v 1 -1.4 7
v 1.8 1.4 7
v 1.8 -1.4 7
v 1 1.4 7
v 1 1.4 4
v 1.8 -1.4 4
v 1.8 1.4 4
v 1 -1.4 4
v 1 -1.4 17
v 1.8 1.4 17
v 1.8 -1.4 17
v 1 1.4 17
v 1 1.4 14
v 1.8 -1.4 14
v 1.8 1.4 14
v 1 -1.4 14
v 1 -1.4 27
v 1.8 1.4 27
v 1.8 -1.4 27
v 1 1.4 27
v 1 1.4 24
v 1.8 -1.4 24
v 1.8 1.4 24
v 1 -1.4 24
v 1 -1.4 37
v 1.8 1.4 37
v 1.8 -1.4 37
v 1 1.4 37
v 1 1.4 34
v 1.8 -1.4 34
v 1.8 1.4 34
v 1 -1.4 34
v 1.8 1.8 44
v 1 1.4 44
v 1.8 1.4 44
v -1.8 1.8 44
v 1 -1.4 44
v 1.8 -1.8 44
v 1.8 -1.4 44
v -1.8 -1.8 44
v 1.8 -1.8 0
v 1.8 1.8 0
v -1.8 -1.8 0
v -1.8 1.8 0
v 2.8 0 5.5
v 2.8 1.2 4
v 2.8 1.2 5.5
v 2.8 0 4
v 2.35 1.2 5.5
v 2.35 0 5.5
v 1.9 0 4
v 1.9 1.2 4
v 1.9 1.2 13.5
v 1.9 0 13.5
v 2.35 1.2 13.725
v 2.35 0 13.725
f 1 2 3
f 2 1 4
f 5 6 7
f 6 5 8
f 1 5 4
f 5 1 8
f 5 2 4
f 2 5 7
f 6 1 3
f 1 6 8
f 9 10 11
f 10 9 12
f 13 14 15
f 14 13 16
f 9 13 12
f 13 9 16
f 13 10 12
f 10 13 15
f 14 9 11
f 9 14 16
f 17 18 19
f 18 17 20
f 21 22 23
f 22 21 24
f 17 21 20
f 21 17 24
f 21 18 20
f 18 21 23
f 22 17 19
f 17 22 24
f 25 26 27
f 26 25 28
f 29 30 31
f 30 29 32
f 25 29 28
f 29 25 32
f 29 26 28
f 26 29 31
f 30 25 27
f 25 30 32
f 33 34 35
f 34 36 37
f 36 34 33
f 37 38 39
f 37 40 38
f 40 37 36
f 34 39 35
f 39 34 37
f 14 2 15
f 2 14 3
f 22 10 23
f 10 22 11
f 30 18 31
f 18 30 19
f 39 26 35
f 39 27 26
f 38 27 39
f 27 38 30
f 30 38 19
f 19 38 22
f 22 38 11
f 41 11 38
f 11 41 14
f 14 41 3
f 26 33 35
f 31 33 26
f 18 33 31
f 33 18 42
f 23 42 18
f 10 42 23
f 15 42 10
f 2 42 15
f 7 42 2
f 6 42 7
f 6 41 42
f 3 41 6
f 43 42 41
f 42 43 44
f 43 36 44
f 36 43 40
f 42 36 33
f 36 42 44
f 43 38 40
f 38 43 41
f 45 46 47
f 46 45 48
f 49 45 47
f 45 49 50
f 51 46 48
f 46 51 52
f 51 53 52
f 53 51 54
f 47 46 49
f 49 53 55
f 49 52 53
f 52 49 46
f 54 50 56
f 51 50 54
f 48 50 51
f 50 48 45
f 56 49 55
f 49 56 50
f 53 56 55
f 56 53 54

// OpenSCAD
// DND-71 S6-LC ultra-low-cost shape display -- real OpenSCAD geometry.
//
// EVIDENCE CLASS: CAD (geometry only). No print, no measurement (DND-27).
// All dimensions are mirrored from ../analysis/s6lc.py.
//
// Machine: 8 banks of 10 rows (80x80 = 6,400 cells) at 5.08 mm pitch.
//   * square printed columns with a 5-pocket vertical rack (10 mm pockets);
//   * printed cantilever pawls (0.90 x 1.20 x 8.00 mm) holding a column;
//   * per-bank threshold mask gate (printed sliding comb) read from a medium;
//   * 8 banked release combs on a travelling reset carriage;
//   * one 4-screw belt-synced platen (printed frame, excluded from the BOM).
//
// Render (real OpenSCAD):
//   openscad -o s6lc_cell.stl       -D 'PART="cell"'    s6lc_machine.scad
//   openscad -o s6lc_bank.stl       -D 'PART="bank"'    s6lc_machine.scad
//   openscad -o s6lc_platen.stl     -D 'PART="platen"'  s6lc_machine.scad

PART = "cell";

// ---- product / geometry constants (analysis/s6lc.py) ----------------------
PITCH       = 5.08;
BODY        = 3.60;      // square column body (S1 lane budget: 3.60 + 1.48 = 5.08)
COL_H       = 44.0;      // column height (40 mm travel + 4 mm base)
TRAVEL      = 40.0;
LEVEL       = 10.0;
POCKET_H    = 3.0;       // rack pocket depth in Z
POCKET_D    = 0.8;       // rack pocket depth in X (S1 coupon)
PAWL_T      = 0.90;      // 2 extrusion lines
PAWL_W      = 1.20;
PAWL_L      = 8.00;
ROWS_BANK   = 10;
COLS        = 80;
BANKS       = 8;

$fn = 48;

module column_with_rack() {
    // Square column body with 5 rack pockets on the +X face.
    difference() {
        translate([-BODY/2, -BODY/2, 0]) cube([BODY, BODY, COL_H]);
        // rack pockets at 0,10,20,30,40 mm above the base
        for (k = [0:4]) {
            translate([BODY/2 - POCKET_D, -BODY/2 + 0.4, 4 + k*LEVEL])
                cube([POCKET_D + 1, BODY - 0.8, POCKET_H]);
        }
    }
}

module pawl() {
    // Rooted cantilever: base block + thin leaf with a wedge toe.
    // Root is attached to the frame (not floating).
    translate([0, 0, 0]) cube([PAWL_T, PAWL_W, 1.5]);          // root block
    translate([0, 0, 1.5]) cube([PAWL_T/2, PAWL_W, PAWL_L]);   // thin leaf
    // toe wedge at the free end (points into the rack)
    translate([0, 0, 1.5 + PAWL_L - 1.2])
        multmatrix([[1,0,0,0],[0,1,0,0],[0.5,0,1,0],[0,0,0,1]])
            cube([PAWL_T/2, PAWL_W, 1.2]);
}

module mask_gate() {
    // Printed sliding comb: body bar + bosses over cells that must be BLOCKED.
    // One per bank (COLS = 80 cells wide); boss pitch = PITCH.
    bar_w = COLS * PITCH;
    translate([0, 0, 0]) cube([bar_w, 1.2, 1.0]);
    for (i = [0 : COLS-1]) {
        // alternating boss pattern is illustrative geometry; the real pattern
        // comes from the map. This renders the printable comb envelope.
        if (i % 2 == 0)
            translate([i*PITCH + PITCH/2 - 0.44, -0.4, 1.0])
                cube([0.88, 2.0, 1.2]);
    }
}

module release_comb() {
    // One bank release comb: a bar with a toe under every cell, lifted by the
    // travelling carriage to trip all pawls of the bank at reset.
    bar_w = COLS * PITCH;
    translate([0, 0, 0]) cube([bar_w, 1.2, 1.0]);
    for (i = [0 : COLS-1]) {
        translate([i*PITCH + PITCH/2 - 0.44, 0.8, 1.0])
            cube([0.88, 1.6, 1.0]);
    }
}

module bank_row() {
    // One row of a bank: 80 cells at true pitch, with pawl + gate lanes.
    for (i = [0 : COLS-1]) {
        translate([i*PITCH, 0, 0]) {
            column_with_rack();
        }
    }
    // pawl lane sits in the Y gap between rows (not rendered per cell here for
    // clarity of the row envelope; the cell module includes the pawl).
}

module cell_assembly() {
    // The unit-cell mechanism: column + pawl (side-by-side lane) + gate lane.
    column_with_rack();
    translate([BODY/2 + 0.10, 0, 4]) pawl();
}

module bank_assembly() {
    // A bank: the full 80-column width at true pitch, rendered as 3
    // representative rows to keep the mesh tractable (the envelope width
    // 80 * PITCH = 406.4 mm is the printability-relevant dimension; the row
    // count does not change any gate). The real bank is 10 rows, sub-tiled.
    for (r = [0 : 2]) {
        translate([0, r*PITCH, 0]) bank_row();
    }
}

if (PART == "cell")     cell_assembly();
if (PART == "bank")     bank_assembly();
if (PART == "gate")     mask_gate();
if (PART == "comb")     release_comb();
if (PART == "platen")   cube([COLS*PITCH, ROWS_BANK*PITCH, 2.0]);
